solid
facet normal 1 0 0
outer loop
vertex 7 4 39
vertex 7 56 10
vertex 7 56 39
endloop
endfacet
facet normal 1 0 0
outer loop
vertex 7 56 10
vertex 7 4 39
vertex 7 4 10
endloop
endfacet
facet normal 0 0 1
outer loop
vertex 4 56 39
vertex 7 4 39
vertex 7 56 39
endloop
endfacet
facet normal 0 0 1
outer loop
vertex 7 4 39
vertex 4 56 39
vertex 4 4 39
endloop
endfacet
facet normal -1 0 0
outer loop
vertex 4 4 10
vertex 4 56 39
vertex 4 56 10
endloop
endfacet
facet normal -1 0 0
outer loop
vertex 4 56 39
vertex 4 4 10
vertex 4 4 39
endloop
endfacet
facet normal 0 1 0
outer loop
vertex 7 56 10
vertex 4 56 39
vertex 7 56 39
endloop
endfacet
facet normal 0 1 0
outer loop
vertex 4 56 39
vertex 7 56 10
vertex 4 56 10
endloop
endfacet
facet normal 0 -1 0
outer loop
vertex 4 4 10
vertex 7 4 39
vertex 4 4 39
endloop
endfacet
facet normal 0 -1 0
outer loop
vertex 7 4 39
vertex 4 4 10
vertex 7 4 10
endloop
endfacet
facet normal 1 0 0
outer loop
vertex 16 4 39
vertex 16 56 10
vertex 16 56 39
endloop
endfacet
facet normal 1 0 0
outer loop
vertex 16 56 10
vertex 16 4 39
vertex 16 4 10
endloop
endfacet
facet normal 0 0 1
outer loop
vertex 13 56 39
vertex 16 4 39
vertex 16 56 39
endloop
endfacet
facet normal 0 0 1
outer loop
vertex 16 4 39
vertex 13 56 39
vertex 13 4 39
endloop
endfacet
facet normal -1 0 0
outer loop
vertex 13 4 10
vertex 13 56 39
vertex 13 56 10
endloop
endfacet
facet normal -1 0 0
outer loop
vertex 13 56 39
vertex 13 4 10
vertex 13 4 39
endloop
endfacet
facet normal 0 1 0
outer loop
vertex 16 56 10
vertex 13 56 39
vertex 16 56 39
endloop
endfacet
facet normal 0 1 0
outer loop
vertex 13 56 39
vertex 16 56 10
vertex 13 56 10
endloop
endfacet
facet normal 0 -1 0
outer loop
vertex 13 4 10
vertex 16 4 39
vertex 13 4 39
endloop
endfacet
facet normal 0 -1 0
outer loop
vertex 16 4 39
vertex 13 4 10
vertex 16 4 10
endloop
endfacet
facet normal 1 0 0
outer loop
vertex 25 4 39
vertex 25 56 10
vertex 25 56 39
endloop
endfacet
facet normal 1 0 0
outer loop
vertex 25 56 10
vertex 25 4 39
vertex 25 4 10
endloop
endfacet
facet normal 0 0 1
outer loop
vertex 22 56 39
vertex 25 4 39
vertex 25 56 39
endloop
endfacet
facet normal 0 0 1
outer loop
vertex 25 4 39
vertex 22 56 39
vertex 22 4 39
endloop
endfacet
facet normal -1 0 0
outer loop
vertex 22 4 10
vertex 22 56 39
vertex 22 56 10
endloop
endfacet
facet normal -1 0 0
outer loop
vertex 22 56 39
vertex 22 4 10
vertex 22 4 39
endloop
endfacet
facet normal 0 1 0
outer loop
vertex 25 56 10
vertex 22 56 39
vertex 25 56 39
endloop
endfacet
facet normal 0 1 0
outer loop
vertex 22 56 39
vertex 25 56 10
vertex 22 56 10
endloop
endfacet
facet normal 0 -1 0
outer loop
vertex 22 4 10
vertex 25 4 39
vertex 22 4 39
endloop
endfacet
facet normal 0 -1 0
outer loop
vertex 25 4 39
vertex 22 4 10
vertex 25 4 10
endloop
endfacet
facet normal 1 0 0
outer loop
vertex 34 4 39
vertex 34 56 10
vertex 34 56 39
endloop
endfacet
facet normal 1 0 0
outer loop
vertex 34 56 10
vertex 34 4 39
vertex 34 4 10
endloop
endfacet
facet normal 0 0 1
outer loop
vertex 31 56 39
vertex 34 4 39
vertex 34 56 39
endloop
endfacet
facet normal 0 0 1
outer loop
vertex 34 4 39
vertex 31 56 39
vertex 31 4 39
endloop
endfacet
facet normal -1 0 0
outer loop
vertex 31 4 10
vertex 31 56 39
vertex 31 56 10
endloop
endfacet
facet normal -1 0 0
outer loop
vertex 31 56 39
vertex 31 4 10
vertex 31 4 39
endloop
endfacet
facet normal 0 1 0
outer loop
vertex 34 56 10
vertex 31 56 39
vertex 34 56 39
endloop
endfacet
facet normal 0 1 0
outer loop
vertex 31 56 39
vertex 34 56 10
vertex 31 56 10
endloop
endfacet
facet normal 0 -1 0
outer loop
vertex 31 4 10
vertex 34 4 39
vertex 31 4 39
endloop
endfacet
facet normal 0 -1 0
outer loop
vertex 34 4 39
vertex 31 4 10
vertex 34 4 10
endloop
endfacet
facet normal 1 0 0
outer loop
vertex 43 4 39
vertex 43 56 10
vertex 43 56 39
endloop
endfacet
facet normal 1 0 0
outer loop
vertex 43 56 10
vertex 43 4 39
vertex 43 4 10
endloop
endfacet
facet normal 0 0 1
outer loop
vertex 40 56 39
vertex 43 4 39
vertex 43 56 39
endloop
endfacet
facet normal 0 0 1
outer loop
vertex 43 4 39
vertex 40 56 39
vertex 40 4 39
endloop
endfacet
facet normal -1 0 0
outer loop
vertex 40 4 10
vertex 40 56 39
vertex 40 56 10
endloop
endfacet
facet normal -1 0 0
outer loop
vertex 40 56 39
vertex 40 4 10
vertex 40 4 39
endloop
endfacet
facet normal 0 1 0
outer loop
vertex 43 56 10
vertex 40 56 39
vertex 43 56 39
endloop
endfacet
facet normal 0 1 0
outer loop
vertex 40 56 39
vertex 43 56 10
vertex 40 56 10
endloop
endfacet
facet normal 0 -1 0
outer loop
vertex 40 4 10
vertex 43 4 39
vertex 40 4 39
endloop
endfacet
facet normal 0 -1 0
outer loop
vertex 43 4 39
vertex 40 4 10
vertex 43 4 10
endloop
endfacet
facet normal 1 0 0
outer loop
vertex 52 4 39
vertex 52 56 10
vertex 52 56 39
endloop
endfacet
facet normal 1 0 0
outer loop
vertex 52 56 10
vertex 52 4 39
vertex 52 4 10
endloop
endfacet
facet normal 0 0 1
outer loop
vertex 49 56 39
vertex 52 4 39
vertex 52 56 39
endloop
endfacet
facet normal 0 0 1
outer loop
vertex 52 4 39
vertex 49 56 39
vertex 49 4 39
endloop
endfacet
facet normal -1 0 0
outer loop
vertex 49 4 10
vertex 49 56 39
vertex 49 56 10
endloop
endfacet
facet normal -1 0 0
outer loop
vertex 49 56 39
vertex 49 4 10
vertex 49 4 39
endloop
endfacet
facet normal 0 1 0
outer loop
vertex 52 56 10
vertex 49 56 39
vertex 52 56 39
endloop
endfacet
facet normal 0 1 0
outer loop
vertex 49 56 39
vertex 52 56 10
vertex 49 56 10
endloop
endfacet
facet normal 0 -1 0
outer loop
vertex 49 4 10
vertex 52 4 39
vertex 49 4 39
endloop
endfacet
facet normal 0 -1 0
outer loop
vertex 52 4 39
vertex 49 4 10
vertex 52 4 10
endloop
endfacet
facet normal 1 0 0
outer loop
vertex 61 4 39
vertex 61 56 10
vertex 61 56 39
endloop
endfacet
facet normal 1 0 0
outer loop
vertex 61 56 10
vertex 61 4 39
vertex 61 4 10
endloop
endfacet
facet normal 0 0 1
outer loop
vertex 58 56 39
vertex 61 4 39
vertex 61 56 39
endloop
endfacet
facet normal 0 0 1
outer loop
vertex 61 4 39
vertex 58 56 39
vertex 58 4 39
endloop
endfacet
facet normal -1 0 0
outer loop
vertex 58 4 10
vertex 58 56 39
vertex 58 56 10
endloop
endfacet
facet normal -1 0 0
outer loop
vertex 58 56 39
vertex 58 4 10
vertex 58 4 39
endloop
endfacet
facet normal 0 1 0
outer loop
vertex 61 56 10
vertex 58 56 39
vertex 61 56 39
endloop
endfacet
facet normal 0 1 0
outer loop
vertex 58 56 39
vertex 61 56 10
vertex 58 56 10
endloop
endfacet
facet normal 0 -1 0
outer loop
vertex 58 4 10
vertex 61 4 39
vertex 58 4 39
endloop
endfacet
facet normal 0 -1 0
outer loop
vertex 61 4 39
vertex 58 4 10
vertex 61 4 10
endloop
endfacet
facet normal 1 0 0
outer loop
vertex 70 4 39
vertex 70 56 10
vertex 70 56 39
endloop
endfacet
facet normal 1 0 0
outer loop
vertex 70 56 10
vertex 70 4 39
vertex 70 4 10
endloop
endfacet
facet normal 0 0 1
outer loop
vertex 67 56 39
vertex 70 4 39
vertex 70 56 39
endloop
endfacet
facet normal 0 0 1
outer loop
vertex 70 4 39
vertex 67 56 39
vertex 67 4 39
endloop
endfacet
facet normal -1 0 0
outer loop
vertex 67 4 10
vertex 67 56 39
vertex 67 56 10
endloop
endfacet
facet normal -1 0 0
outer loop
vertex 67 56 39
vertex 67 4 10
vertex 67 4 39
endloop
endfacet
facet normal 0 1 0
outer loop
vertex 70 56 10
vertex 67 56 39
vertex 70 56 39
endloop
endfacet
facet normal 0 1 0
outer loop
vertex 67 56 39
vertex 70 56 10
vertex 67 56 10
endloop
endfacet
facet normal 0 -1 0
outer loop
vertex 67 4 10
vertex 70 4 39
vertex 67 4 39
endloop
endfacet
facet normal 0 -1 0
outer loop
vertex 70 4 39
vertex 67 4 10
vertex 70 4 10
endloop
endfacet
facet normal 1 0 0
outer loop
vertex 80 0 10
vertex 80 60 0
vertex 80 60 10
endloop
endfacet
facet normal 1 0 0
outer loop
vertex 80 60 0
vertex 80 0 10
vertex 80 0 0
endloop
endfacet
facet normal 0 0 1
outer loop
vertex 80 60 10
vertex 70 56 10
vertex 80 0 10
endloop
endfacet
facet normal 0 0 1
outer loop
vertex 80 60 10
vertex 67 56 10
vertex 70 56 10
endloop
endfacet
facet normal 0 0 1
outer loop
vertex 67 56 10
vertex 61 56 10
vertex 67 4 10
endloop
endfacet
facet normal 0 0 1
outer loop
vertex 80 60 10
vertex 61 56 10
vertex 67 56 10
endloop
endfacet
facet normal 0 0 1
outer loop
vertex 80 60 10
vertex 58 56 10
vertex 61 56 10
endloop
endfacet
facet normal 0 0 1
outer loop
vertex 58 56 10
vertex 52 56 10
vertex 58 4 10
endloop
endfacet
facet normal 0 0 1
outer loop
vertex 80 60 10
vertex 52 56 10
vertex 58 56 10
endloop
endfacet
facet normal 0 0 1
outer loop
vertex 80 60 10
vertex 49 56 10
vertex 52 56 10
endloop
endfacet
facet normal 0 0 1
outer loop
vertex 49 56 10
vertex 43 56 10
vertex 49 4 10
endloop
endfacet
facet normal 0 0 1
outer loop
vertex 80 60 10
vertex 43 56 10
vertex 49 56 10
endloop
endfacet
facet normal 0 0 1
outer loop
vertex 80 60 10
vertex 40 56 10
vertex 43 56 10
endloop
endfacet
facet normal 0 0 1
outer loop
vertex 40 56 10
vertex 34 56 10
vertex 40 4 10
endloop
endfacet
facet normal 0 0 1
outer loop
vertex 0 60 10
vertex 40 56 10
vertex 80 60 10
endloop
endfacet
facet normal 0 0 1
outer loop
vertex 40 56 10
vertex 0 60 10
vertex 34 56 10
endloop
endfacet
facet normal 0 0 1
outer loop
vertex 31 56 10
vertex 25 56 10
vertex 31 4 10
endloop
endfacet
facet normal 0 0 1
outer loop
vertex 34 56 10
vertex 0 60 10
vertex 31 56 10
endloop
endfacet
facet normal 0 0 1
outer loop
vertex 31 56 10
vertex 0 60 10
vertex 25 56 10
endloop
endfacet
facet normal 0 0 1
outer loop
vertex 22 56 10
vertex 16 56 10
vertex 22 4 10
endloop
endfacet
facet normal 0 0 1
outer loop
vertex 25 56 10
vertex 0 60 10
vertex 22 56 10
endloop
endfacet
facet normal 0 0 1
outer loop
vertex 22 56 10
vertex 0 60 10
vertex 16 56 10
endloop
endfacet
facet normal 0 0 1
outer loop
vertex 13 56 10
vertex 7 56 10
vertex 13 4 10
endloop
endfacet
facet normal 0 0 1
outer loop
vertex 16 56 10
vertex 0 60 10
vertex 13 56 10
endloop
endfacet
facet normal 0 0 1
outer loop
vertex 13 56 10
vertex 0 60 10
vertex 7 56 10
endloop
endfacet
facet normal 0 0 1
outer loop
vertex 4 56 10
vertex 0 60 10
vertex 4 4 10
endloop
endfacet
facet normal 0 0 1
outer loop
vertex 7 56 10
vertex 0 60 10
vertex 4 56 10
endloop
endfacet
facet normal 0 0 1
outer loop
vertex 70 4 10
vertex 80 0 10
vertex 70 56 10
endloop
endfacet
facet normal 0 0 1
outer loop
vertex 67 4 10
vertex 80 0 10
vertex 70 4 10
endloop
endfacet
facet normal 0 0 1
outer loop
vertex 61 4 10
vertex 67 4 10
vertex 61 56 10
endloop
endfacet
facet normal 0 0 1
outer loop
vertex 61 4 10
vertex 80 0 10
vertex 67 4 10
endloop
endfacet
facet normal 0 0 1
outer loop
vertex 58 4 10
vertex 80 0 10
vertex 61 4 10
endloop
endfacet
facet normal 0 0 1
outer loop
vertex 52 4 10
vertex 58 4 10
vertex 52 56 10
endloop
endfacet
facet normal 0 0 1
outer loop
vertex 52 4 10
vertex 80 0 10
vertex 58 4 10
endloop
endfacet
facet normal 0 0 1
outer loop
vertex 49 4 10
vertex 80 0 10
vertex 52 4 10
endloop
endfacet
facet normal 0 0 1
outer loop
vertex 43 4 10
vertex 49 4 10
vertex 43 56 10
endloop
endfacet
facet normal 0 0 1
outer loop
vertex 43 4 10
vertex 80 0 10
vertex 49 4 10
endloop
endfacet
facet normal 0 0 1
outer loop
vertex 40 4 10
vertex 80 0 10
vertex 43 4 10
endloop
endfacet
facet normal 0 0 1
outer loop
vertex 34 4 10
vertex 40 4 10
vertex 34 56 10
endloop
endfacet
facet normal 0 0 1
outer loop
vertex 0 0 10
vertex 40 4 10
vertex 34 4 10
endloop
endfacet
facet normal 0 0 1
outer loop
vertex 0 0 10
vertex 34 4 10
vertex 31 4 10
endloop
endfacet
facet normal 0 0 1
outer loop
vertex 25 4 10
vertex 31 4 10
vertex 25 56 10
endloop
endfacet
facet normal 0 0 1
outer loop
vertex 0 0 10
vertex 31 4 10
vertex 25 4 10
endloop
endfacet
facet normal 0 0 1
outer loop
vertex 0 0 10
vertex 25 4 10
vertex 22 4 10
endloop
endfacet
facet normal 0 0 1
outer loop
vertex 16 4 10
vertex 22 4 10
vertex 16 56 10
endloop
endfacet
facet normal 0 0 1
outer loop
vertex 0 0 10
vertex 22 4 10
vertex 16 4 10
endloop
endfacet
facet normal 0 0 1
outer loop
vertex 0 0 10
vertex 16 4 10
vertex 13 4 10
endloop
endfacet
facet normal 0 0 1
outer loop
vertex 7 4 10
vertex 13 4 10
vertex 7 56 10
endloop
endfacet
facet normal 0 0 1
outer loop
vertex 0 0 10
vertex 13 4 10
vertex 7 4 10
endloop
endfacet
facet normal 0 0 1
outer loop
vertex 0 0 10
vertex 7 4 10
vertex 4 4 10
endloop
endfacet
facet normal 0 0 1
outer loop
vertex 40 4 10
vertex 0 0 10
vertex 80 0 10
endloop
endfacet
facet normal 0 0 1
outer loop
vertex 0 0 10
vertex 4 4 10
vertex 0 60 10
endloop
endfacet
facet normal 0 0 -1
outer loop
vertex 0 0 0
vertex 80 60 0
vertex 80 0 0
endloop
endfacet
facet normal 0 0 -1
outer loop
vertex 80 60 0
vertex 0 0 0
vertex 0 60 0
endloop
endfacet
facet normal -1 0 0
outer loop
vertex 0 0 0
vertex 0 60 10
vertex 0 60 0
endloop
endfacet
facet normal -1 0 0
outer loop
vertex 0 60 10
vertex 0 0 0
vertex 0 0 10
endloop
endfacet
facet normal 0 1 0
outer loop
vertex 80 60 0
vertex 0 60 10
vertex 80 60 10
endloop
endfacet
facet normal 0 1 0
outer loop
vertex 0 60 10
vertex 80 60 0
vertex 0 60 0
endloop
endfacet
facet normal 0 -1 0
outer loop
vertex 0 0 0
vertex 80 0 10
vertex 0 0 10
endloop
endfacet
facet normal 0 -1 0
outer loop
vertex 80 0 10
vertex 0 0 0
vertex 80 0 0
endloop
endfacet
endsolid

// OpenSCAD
$fn = 32;

// ----------------------------------------------------------------------
// Heatsink: uniform fin block
// ----------------------------------------------------------------------

// --- parameters (mm) ---
base_l = 80;              // base length, X
base_w = 60;              // base width, Y
base_t = 10;              // base plate thickness
fin_h = 30;               // fin height above the base
fin_t = 3;                // fin thickness
edge = 4;                 // margin from the base ends
pitch = 9;                // fin pitch

n_fins = floor((base_l - 2 * edge - fin_t) / pitch) + 1;  // fin count
total_h = base_t + fin_h - 1;  // overall height

union() {
  cube([base_l, base_w, base_t]);
  for (i = [0 : n_fins - 1])
    translate([edge + i * pitch, edge, base_t - 1])
      cube([fin_t, base_w - 2 * edge, fin_h]);
}
